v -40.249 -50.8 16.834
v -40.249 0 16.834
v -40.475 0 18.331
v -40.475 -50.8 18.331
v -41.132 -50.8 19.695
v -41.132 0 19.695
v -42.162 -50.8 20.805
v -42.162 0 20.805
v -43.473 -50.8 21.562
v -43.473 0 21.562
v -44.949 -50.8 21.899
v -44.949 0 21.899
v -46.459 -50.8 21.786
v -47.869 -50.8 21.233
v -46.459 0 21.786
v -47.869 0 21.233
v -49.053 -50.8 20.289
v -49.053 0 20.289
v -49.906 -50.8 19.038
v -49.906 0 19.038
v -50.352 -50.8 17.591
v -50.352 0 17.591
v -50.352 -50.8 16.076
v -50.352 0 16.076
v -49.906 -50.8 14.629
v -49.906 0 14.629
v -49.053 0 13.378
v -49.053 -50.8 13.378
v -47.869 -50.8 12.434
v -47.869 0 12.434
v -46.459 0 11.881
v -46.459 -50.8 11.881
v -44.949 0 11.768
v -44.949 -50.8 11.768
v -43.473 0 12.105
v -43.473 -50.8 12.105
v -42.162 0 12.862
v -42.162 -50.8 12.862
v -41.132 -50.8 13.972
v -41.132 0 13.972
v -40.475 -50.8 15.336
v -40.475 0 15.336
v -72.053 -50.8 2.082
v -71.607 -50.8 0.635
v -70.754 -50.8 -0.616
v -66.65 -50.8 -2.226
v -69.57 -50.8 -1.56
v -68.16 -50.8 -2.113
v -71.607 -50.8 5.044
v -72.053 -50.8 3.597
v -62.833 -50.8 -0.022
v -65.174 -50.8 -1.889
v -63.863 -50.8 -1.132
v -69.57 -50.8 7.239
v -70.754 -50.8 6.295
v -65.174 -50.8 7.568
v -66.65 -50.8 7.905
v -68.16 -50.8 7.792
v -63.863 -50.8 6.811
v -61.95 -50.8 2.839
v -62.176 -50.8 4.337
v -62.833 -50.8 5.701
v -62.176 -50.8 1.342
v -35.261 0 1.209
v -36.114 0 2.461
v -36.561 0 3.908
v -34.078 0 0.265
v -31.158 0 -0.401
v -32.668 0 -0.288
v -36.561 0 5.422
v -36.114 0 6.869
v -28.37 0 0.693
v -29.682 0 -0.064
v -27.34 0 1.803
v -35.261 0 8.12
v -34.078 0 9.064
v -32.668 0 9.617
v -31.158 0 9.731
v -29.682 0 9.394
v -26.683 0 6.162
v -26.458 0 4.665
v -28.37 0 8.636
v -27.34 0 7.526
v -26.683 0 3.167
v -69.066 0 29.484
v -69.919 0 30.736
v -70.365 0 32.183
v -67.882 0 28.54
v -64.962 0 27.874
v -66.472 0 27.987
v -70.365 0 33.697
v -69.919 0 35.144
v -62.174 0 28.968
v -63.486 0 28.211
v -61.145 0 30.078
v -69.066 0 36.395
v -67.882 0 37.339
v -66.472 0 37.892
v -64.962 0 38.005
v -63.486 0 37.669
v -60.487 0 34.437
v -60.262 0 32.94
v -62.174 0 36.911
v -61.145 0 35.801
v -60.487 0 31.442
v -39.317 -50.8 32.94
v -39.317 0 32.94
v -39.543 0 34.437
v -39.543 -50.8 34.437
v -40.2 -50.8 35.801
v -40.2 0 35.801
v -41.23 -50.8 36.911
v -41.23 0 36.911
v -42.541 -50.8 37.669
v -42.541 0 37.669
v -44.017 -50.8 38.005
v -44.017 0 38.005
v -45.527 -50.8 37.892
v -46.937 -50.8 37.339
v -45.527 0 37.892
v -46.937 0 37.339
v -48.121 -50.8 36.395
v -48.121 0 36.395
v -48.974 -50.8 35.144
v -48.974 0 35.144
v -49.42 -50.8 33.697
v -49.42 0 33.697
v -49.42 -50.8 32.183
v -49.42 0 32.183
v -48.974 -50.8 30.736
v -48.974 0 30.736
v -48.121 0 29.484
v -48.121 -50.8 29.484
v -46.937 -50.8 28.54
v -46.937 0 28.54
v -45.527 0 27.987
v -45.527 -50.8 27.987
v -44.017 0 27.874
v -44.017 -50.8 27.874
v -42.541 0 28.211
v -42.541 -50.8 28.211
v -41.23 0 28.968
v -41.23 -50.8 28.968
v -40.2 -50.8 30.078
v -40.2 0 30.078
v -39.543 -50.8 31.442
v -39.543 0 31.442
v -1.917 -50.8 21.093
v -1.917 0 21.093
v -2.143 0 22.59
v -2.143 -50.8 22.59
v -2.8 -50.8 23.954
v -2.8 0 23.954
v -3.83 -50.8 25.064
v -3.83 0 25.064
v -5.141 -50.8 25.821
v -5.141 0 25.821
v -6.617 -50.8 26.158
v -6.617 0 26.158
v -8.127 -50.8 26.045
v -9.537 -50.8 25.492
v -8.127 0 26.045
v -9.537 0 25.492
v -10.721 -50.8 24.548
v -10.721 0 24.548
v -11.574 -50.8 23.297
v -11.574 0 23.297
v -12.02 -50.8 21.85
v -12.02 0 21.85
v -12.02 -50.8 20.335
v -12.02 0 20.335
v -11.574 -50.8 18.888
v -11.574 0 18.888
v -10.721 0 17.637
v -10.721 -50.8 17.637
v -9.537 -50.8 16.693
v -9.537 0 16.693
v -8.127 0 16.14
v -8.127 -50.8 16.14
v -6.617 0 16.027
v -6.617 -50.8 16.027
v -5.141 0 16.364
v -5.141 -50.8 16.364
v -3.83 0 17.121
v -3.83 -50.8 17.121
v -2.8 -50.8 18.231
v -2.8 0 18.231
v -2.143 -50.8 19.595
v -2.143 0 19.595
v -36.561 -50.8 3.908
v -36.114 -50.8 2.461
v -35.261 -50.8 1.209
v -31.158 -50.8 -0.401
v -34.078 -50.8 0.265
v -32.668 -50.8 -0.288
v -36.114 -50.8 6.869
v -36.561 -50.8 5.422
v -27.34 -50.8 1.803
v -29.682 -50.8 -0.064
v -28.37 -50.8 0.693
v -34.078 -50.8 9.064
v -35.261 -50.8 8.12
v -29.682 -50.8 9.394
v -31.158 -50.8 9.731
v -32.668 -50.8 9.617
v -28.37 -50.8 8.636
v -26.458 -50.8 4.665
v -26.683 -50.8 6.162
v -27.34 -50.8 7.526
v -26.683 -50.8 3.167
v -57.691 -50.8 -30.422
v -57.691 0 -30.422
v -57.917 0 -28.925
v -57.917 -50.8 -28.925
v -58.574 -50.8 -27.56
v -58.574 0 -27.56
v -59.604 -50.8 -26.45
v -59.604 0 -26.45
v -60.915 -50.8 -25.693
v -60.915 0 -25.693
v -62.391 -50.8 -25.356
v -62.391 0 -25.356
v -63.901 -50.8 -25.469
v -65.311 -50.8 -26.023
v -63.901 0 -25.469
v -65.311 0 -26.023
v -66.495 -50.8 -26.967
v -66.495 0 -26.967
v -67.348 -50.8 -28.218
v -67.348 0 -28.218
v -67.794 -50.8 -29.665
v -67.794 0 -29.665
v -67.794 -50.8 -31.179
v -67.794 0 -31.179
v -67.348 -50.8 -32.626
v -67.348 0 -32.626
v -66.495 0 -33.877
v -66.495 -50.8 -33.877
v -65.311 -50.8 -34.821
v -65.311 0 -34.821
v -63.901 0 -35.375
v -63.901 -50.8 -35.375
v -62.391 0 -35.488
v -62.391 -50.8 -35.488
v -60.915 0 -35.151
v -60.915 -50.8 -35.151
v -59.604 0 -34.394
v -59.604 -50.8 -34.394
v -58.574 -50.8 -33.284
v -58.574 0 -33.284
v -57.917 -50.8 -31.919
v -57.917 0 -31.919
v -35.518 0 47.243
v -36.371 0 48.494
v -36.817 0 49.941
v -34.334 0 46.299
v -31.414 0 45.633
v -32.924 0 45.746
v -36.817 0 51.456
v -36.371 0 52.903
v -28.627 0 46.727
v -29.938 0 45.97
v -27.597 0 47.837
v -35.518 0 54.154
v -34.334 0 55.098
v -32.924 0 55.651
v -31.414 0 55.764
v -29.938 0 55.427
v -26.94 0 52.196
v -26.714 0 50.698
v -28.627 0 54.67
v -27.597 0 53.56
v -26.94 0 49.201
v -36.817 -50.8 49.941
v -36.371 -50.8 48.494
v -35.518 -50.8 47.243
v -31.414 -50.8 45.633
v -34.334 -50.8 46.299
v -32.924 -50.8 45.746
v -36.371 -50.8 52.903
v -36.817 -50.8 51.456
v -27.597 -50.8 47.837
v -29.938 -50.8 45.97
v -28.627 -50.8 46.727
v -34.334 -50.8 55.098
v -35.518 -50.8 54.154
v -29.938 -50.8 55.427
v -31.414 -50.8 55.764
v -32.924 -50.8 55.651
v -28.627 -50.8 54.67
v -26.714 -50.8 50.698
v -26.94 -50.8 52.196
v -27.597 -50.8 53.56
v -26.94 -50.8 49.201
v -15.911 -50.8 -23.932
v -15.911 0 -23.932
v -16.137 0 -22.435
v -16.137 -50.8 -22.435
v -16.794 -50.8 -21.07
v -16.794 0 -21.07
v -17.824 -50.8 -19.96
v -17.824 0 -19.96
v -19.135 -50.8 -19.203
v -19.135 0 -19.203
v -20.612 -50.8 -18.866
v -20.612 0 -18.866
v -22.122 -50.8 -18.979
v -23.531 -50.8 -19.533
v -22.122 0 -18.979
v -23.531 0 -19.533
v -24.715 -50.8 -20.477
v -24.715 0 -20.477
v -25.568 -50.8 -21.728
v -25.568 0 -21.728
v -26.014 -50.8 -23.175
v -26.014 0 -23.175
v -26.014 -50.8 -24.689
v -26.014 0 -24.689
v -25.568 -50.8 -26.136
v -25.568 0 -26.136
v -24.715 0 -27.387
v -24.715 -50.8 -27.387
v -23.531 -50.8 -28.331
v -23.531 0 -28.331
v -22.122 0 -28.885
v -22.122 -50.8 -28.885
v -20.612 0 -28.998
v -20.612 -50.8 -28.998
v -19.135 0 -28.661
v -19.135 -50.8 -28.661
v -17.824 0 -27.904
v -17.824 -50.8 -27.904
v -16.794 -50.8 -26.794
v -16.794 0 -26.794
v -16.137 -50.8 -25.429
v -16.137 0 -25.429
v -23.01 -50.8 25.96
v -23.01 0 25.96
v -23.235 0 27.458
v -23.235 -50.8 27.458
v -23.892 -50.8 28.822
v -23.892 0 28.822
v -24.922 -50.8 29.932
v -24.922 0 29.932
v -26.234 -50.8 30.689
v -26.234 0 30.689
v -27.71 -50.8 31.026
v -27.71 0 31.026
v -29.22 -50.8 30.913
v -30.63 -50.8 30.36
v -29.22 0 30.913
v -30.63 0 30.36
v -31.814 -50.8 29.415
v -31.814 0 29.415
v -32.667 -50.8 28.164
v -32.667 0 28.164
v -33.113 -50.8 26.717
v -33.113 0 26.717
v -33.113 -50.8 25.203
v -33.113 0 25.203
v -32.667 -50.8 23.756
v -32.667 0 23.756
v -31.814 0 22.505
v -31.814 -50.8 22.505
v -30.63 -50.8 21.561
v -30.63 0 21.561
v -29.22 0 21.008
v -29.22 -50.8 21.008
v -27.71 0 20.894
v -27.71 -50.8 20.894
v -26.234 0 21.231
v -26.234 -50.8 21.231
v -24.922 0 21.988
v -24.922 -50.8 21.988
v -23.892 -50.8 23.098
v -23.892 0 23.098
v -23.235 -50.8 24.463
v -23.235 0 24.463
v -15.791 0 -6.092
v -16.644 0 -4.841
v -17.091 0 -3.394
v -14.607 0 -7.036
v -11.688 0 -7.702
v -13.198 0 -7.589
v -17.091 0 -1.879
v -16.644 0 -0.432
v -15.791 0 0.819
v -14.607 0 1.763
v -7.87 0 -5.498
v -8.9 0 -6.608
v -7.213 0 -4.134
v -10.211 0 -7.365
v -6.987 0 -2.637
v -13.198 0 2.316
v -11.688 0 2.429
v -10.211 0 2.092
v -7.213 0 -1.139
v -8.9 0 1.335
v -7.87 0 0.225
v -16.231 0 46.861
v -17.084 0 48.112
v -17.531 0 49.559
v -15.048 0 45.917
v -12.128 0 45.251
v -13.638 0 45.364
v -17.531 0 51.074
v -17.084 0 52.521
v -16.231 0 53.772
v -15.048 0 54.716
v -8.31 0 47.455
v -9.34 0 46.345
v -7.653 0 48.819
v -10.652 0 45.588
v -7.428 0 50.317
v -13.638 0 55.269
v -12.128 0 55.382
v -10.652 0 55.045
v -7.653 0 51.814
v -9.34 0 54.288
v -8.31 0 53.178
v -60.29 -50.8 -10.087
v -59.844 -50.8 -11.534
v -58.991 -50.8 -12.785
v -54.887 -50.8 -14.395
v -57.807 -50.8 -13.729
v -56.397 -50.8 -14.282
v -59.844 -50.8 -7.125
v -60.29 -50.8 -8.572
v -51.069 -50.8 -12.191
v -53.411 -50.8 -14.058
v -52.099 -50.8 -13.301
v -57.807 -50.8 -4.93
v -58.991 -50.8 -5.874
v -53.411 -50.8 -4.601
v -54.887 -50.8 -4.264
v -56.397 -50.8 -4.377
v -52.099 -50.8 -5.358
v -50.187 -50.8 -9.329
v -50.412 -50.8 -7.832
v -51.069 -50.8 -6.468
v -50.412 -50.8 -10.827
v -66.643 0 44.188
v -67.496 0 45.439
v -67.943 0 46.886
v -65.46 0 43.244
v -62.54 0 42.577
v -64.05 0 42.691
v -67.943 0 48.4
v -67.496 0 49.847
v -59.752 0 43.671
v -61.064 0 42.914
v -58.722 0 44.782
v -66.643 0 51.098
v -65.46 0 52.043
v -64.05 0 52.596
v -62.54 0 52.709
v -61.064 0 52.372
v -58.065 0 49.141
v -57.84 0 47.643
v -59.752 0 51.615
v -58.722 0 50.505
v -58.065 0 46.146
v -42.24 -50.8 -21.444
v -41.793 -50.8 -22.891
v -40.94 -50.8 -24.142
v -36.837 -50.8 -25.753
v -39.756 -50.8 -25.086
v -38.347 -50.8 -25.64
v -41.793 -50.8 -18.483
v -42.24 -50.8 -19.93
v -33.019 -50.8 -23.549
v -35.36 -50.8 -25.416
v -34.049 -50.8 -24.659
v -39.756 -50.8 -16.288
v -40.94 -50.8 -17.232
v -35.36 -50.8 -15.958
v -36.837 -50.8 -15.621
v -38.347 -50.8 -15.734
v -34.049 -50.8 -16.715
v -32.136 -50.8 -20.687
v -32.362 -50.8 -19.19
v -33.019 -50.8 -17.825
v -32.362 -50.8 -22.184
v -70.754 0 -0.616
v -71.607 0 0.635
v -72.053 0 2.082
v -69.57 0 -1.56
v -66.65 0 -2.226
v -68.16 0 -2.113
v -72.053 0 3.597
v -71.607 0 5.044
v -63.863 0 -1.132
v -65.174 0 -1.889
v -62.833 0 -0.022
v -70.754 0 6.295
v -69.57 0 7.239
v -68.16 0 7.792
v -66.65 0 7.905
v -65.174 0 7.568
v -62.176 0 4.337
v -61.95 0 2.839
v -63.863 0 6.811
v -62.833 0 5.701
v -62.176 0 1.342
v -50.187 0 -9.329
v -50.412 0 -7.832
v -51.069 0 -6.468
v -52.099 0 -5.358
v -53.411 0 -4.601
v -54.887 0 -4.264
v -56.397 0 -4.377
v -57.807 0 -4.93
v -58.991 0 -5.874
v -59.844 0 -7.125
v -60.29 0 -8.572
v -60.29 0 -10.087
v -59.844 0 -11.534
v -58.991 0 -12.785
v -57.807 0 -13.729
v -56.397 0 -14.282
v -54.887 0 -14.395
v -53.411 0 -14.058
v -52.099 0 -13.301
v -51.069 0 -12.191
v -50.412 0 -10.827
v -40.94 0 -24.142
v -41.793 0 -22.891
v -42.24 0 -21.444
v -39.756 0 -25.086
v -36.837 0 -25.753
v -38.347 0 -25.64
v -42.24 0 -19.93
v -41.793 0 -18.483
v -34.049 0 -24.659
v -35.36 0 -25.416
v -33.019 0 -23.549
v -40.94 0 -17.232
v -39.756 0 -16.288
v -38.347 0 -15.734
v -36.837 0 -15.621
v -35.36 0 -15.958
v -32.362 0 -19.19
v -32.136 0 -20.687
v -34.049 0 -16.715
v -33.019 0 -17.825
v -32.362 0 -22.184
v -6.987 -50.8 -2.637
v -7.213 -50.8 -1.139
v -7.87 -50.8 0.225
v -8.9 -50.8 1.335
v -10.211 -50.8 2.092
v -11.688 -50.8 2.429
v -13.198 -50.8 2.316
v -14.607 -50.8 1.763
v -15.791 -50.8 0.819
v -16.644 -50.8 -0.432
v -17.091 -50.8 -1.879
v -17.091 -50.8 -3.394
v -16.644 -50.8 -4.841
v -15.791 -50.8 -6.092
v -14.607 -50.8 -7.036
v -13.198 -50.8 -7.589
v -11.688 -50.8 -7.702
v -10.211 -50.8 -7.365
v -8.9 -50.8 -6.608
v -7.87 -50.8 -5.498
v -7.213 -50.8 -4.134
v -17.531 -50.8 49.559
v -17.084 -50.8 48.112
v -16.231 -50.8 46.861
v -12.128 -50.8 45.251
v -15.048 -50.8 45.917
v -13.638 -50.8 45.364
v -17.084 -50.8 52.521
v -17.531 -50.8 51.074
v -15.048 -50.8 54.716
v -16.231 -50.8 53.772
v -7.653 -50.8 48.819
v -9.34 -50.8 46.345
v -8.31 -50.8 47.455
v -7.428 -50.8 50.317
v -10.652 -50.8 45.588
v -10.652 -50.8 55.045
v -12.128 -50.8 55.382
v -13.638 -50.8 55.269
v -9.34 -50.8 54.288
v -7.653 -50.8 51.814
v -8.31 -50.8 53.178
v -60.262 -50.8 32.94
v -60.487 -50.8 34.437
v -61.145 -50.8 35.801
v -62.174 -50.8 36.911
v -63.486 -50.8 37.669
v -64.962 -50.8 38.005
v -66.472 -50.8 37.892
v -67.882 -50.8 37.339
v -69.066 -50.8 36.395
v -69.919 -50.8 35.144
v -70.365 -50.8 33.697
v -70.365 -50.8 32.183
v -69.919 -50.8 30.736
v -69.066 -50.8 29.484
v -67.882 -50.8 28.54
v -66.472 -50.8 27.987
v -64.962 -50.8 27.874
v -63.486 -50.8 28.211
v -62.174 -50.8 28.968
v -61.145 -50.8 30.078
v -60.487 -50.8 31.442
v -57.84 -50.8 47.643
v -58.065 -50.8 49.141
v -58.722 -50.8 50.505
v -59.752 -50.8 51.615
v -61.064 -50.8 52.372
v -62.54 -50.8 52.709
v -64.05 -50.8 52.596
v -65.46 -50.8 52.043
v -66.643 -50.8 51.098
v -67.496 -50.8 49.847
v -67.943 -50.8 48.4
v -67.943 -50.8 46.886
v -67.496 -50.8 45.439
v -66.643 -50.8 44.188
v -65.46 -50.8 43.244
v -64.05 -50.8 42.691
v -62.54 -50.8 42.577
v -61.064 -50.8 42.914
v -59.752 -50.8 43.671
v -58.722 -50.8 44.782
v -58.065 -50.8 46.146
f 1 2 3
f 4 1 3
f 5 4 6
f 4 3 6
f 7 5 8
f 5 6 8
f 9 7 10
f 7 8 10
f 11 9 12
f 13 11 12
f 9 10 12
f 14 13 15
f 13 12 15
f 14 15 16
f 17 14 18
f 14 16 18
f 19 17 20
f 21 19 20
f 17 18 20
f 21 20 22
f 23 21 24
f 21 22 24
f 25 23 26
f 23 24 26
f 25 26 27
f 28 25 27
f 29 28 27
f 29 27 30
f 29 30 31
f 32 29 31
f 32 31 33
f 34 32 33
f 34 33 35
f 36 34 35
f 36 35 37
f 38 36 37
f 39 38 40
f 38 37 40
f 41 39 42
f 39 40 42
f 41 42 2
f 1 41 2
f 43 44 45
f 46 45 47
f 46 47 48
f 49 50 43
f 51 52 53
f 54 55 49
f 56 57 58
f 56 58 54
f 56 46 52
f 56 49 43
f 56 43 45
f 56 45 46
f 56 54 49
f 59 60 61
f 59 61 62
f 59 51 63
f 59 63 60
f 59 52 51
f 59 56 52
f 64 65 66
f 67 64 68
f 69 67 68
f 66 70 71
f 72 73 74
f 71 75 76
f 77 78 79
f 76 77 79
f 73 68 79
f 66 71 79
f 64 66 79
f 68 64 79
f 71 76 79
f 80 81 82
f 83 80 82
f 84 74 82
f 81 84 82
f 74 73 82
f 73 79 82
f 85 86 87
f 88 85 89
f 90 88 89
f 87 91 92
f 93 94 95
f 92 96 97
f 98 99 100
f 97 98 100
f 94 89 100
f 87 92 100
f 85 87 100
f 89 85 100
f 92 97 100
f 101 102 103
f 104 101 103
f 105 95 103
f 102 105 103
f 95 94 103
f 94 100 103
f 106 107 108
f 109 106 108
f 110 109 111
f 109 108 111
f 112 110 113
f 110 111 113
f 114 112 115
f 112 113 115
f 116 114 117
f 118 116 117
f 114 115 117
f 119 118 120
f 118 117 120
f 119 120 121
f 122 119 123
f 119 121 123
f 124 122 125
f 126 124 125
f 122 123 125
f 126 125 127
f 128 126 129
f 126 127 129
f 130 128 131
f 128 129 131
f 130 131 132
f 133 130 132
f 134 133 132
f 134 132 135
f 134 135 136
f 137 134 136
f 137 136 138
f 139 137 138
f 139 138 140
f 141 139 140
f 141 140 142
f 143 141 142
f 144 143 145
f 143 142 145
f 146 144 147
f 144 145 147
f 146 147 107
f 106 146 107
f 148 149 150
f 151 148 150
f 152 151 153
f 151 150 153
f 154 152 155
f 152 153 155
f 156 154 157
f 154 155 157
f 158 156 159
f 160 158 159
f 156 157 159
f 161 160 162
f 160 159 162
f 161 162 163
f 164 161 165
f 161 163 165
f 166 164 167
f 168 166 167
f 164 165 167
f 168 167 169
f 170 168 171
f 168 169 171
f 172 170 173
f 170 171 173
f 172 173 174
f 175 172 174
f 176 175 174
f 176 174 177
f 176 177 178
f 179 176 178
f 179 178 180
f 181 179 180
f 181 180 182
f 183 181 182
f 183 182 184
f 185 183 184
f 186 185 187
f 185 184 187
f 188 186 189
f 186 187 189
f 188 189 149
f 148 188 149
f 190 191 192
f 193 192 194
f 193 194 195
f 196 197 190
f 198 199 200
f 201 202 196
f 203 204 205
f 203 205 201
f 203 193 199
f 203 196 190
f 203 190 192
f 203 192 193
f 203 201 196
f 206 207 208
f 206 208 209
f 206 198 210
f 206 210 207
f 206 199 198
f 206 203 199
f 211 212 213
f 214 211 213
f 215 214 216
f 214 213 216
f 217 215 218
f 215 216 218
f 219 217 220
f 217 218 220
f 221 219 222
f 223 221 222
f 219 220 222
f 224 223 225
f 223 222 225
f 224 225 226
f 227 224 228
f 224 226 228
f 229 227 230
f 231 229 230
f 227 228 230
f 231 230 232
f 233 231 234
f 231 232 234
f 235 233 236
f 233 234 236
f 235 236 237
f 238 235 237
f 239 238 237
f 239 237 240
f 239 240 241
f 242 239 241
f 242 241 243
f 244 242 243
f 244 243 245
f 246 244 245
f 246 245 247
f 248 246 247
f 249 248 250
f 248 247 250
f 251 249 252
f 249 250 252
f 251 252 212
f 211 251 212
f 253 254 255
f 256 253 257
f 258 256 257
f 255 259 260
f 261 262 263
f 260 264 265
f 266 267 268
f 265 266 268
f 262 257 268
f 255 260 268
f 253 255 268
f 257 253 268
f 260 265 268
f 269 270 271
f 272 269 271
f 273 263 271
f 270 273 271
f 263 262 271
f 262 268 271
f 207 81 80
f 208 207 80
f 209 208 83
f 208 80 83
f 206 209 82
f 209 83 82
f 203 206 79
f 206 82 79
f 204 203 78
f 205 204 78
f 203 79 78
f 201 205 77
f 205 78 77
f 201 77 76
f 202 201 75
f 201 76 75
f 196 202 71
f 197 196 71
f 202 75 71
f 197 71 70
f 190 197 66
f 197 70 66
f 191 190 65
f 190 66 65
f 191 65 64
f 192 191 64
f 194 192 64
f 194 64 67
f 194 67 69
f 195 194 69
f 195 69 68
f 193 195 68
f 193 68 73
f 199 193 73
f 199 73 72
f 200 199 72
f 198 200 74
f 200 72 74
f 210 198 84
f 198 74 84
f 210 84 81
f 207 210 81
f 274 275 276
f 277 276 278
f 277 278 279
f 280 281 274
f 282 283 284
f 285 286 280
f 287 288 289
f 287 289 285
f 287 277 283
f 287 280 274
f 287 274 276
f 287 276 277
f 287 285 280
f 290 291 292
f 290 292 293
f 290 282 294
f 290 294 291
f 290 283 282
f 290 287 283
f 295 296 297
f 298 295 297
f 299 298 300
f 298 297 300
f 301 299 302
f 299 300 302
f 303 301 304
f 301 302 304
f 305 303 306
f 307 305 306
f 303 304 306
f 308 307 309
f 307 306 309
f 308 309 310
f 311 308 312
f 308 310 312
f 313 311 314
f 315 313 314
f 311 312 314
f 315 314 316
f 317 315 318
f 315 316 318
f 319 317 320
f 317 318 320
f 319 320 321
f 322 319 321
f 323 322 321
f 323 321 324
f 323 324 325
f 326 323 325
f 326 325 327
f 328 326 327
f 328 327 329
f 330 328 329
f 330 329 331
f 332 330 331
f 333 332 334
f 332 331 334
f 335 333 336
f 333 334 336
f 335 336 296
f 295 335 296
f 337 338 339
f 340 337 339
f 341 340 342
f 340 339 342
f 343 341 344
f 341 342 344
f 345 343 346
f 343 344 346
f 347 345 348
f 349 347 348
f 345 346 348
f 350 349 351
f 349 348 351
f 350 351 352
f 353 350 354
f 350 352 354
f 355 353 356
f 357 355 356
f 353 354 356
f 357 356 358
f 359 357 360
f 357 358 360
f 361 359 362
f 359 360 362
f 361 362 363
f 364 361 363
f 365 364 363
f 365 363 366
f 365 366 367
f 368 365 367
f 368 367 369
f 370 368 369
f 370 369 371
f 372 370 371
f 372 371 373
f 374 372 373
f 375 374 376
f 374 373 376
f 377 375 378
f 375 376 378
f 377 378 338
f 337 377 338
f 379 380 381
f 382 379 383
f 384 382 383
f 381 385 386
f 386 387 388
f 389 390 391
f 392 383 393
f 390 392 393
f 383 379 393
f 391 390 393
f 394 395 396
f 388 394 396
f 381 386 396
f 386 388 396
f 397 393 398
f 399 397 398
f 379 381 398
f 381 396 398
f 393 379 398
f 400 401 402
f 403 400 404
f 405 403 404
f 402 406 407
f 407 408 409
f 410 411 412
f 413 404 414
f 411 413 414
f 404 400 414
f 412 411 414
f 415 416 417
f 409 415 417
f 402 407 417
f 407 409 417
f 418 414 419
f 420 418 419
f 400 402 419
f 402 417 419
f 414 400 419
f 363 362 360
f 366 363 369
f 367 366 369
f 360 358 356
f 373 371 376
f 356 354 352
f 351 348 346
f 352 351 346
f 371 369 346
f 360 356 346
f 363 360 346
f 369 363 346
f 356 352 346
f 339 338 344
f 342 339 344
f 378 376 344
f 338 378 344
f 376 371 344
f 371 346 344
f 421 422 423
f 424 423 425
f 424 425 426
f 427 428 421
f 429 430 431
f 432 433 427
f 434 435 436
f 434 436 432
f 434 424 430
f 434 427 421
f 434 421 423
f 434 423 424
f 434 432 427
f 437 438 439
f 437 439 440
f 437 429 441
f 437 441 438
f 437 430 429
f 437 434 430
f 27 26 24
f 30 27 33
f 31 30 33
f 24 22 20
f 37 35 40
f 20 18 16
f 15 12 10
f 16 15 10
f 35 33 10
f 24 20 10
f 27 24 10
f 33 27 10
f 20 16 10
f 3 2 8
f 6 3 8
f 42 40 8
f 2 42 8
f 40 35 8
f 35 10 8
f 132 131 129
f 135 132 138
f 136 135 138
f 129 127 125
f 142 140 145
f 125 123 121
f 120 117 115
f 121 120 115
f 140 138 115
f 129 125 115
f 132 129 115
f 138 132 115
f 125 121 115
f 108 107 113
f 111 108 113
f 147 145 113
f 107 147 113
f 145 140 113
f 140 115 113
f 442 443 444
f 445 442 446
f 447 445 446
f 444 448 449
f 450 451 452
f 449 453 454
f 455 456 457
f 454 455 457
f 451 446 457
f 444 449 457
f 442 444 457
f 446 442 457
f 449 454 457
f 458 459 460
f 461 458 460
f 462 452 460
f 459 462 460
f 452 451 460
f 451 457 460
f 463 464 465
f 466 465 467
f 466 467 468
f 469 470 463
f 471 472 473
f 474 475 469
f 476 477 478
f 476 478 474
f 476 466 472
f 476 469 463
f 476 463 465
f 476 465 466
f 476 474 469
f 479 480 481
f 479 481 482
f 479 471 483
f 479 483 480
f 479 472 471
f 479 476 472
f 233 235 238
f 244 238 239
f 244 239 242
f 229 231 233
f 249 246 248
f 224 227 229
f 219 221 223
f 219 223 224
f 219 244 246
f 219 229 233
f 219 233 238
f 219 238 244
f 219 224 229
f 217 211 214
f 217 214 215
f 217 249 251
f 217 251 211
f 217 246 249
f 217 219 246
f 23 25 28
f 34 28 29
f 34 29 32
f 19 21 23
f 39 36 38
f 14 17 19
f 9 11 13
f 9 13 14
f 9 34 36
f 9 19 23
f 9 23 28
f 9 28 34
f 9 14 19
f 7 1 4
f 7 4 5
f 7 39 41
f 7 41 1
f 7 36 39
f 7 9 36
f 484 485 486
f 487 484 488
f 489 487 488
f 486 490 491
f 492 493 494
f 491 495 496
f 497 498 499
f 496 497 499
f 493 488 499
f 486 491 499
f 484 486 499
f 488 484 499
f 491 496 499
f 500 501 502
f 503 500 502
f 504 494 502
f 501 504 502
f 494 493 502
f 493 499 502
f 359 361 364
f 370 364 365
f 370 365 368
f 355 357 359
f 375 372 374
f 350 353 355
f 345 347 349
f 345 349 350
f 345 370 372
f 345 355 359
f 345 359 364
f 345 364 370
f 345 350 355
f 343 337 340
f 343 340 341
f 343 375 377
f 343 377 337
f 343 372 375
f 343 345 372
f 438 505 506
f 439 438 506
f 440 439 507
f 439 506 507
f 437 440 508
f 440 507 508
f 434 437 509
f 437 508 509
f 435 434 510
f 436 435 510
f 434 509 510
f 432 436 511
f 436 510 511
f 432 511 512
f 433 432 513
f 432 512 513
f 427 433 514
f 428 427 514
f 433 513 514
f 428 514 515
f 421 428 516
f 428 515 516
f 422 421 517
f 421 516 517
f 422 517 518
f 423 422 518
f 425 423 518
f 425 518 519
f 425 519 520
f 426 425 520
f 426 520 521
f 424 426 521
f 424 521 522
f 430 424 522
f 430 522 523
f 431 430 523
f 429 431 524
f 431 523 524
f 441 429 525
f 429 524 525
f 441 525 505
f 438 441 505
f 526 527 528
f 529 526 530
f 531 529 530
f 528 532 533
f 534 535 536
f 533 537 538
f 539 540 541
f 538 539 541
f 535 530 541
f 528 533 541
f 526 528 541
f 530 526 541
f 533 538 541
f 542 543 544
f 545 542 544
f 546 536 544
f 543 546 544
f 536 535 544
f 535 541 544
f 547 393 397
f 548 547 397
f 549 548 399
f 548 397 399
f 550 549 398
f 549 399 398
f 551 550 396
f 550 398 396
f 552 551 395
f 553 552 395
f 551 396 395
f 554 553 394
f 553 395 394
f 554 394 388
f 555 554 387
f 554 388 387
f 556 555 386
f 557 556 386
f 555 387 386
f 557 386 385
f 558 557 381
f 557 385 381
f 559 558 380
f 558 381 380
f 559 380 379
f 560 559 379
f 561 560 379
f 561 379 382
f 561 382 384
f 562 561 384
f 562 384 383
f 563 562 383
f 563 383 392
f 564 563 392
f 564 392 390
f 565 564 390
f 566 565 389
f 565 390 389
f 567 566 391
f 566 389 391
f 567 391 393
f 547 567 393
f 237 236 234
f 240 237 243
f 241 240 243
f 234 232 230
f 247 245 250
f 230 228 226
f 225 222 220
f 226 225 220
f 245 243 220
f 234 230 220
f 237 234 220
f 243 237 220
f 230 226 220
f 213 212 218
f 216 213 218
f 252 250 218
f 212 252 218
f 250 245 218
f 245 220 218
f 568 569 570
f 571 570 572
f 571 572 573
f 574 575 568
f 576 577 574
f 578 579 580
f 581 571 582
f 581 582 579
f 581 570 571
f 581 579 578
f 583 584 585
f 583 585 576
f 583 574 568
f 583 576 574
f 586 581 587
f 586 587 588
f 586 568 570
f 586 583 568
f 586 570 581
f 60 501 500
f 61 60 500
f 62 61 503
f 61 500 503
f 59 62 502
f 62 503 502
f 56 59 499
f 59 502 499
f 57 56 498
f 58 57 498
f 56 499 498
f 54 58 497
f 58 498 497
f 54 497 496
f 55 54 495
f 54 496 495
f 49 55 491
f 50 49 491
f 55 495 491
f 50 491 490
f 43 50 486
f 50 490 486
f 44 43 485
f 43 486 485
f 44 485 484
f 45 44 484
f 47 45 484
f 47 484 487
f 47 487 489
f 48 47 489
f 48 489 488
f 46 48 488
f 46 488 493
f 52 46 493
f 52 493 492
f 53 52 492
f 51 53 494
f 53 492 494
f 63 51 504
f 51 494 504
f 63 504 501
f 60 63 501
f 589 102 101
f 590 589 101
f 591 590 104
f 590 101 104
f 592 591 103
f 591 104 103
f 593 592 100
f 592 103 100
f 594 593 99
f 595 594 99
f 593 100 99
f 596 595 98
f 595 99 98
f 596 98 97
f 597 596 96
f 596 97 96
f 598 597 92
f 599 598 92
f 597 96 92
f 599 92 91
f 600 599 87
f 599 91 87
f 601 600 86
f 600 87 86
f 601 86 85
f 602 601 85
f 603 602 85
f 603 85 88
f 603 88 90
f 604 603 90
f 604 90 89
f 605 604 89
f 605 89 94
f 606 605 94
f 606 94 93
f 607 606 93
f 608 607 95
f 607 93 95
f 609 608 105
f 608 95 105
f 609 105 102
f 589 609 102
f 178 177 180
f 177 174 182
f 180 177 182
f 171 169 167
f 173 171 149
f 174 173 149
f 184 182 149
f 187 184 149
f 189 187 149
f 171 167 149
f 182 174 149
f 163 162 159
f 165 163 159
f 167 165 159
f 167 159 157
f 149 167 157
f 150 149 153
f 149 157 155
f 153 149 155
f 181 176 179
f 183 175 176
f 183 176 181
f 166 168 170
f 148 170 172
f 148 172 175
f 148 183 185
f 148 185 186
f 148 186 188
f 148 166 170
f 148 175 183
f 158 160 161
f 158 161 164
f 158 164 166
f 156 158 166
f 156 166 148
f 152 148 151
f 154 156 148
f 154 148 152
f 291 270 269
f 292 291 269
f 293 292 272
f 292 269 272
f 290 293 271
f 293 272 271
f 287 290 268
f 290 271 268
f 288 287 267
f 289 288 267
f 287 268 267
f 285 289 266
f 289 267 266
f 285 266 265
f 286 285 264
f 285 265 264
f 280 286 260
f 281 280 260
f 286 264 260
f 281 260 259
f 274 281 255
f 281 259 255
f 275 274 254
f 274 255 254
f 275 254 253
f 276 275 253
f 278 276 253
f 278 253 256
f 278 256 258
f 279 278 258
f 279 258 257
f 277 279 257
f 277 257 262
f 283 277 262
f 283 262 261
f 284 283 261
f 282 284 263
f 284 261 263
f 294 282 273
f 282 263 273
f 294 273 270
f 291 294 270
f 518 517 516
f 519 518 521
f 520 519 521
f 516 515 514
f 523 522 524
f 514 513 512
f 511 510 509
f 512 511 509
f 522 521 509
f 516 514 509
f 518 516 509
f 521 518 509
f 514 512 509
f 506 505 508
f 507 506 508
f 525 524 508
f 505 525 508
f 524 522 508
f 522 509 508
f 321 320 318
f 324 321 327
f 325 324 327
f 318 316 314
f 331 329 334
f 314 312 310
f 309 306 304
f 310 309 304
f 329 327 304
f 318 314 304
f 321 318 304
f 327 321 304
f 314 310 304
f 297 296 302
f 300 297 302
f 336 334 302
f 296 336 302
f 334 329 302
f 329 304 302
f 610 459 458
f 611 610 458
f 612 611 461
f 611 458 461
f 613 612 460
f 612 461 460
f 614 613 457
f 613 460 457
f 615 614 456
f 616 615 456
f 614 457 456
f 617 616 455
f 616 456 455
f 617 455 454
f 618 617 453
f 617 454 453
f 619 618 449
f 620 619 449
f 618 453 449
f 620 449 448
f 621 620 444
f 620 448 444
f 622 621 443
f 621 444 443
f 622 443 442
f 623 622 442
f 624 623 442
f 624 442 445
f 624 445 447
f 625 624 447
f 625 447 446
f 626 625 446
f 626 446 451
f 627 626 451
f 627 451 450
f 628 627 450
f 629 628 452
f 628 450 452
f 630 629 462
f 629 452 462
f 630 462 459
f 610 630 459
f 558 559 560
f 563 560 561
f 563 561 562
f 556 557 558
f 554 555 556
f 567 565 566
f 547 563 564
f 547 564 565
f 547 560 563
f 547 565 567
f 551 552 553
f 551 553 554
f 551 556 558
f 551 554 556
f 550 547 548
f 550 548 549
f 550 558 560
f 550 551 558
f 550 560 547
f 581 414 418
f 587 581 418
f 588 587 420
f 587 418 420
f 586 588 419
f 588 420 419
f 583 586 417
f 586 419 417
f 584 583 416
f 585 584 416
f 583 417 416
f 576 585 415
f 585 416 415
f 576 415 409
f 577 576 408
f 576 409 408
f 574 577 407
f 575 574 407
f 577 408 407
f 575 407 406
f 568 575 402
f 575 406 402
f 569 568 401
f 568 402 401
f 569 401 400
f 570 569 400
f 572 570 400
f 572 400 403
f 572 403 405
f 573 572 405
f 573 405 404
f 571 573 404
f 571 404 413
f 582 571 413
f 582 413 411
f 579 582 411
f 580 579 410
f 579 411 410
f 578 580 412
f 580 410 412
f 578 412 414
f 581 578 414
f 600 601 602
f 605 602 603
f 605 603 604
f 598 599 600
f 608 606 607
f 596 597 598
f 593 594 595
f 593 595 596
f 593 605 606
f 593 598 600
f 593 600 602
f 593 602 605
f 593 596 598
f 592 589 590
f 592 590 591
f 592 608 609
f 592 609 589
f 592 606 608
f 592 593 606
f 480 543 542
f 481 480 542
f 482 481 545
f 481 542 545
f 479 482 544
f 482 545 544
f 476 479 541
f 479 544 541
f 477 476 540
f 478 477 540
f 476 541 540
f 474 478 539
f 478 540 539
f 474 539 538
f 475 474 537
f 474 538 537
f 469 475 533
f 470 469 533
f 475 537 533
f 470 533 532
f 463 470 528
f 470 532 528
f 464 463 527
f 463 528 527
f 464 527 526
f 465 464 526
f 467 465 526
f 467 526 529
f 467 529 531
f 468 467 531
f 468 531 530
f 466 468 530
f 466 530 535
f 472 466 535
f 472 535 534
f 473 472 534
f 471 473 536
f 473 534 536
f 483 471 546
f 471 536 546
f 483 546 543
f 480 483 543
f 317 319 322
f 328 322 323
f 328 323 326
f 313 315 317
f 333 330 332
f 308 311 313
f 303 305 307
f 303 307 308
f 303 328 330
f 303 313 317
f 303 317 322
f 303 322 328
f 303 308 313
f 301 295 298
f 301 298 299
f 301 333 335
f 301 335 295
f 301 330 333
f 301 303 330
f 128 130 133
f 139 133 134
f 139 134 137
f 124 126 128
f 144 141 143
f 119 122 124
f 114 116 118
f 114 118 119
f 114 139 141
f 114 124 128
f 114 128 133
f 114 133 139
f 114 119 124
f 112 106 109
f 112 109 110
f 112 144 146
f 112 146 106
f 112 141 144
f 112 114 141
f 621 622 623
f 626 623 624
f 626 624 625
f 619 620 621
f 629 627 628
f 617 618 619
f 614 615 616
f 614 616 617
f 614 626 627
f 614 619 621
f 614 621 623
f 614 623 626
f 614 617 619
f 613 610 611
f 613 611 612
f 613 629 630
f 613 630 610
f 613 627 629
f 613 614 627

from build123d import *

# Parameters (mm, degrees)
F0_R      = 5.08
F1_DEPTH  = 50.8
F2_R      = 5.08
F3_DEPTH  = 50.8
F4_R      = 5.08
F5_DEPTH  = 50.8
F6_R      = 5.08
F7_DEPTH  = 50.8
F8_R      = 5.08
F9_DEPTH  = 50.8
F10_R     = 5.08
F11_DEPTH = 50.8


with BuildPart() as f1:
    # F0 (on Front) → F1 (new body)
    with BuildSketch(Plane.XZ):
        with Locations((-62.919557, 47.643188)):
            Circle(F0_R)
    extrude(amount=F1_DEPTH)


with BuildPart() as f3:
    # F2 (on Front) → F3 (new body)
    with BuildSketch(Plane.XZ):
        with Locations((-31.793948, 50.698463)):
            Circle(F2_R)
    extrude(amount=F3_DEPTH)


with BuildPart() as f5:
    # F4 (on Front) → F5 (new body)
    with BuildSketch(Plane.XZ):
        with Locations((-12.50753, 50.316554)):
            Circle(F4_R)
    extrude(amount=F5_DEPTH)


with BuildPart() as f7:
    # F6 (on Front) → F7 (new body)
    with BuildSketch(Plane.XZ):
        with Locations((-65.341808, 32.939676)):
            Circle(F6_R)
    extrude(amount=F7_DEPTH)


with BuildPart() as f9:
    # F8 (on Front) → F9 (new body)
    with BuildSketch(Plane.XZ):
        with Locations((-44.396956, 32.939676)):
            Circle(F8_R)
    extrude(amount=F9_DEPTH)


with BuildPart() as f11:
    # F10 (on Front) → F11 (new body)
    with BuildSketch(Plane.XZ):
        with Locations((-45.328859, 16.833536)):
            Circle(F10_R)
        with Locations((-28.089697, 25.960153)):
            Circle(F10_R)
        with Locations((-31.537529, 4.664715)):
            Circle(F10_R)
        with Locations((-67.029923, 2.839392)):
            Circle(F10_R)
        with Locations((-6.997073, 21.092623)):
            Circle(F10_R)
        with Locations((-12.067415, -2.636578)):
            Circle(F10_R)
        with Locations((-55.26673, -9.32943)):
            Circle(F10_R)
        with Locations((-37.216313, -20.686997)):
            Circle(F10_R)
        with Locations((-20.991217, -23.932016)):
            Circle(F10_R)
        with Locations((-62.770836, -30.422052)):
            Circle(F10_R)
    extrude(amount=F11_DEPTH)


solid = Compound([f1.part, f3.part, f5.part, f7.part, f9.part, f11.part])
